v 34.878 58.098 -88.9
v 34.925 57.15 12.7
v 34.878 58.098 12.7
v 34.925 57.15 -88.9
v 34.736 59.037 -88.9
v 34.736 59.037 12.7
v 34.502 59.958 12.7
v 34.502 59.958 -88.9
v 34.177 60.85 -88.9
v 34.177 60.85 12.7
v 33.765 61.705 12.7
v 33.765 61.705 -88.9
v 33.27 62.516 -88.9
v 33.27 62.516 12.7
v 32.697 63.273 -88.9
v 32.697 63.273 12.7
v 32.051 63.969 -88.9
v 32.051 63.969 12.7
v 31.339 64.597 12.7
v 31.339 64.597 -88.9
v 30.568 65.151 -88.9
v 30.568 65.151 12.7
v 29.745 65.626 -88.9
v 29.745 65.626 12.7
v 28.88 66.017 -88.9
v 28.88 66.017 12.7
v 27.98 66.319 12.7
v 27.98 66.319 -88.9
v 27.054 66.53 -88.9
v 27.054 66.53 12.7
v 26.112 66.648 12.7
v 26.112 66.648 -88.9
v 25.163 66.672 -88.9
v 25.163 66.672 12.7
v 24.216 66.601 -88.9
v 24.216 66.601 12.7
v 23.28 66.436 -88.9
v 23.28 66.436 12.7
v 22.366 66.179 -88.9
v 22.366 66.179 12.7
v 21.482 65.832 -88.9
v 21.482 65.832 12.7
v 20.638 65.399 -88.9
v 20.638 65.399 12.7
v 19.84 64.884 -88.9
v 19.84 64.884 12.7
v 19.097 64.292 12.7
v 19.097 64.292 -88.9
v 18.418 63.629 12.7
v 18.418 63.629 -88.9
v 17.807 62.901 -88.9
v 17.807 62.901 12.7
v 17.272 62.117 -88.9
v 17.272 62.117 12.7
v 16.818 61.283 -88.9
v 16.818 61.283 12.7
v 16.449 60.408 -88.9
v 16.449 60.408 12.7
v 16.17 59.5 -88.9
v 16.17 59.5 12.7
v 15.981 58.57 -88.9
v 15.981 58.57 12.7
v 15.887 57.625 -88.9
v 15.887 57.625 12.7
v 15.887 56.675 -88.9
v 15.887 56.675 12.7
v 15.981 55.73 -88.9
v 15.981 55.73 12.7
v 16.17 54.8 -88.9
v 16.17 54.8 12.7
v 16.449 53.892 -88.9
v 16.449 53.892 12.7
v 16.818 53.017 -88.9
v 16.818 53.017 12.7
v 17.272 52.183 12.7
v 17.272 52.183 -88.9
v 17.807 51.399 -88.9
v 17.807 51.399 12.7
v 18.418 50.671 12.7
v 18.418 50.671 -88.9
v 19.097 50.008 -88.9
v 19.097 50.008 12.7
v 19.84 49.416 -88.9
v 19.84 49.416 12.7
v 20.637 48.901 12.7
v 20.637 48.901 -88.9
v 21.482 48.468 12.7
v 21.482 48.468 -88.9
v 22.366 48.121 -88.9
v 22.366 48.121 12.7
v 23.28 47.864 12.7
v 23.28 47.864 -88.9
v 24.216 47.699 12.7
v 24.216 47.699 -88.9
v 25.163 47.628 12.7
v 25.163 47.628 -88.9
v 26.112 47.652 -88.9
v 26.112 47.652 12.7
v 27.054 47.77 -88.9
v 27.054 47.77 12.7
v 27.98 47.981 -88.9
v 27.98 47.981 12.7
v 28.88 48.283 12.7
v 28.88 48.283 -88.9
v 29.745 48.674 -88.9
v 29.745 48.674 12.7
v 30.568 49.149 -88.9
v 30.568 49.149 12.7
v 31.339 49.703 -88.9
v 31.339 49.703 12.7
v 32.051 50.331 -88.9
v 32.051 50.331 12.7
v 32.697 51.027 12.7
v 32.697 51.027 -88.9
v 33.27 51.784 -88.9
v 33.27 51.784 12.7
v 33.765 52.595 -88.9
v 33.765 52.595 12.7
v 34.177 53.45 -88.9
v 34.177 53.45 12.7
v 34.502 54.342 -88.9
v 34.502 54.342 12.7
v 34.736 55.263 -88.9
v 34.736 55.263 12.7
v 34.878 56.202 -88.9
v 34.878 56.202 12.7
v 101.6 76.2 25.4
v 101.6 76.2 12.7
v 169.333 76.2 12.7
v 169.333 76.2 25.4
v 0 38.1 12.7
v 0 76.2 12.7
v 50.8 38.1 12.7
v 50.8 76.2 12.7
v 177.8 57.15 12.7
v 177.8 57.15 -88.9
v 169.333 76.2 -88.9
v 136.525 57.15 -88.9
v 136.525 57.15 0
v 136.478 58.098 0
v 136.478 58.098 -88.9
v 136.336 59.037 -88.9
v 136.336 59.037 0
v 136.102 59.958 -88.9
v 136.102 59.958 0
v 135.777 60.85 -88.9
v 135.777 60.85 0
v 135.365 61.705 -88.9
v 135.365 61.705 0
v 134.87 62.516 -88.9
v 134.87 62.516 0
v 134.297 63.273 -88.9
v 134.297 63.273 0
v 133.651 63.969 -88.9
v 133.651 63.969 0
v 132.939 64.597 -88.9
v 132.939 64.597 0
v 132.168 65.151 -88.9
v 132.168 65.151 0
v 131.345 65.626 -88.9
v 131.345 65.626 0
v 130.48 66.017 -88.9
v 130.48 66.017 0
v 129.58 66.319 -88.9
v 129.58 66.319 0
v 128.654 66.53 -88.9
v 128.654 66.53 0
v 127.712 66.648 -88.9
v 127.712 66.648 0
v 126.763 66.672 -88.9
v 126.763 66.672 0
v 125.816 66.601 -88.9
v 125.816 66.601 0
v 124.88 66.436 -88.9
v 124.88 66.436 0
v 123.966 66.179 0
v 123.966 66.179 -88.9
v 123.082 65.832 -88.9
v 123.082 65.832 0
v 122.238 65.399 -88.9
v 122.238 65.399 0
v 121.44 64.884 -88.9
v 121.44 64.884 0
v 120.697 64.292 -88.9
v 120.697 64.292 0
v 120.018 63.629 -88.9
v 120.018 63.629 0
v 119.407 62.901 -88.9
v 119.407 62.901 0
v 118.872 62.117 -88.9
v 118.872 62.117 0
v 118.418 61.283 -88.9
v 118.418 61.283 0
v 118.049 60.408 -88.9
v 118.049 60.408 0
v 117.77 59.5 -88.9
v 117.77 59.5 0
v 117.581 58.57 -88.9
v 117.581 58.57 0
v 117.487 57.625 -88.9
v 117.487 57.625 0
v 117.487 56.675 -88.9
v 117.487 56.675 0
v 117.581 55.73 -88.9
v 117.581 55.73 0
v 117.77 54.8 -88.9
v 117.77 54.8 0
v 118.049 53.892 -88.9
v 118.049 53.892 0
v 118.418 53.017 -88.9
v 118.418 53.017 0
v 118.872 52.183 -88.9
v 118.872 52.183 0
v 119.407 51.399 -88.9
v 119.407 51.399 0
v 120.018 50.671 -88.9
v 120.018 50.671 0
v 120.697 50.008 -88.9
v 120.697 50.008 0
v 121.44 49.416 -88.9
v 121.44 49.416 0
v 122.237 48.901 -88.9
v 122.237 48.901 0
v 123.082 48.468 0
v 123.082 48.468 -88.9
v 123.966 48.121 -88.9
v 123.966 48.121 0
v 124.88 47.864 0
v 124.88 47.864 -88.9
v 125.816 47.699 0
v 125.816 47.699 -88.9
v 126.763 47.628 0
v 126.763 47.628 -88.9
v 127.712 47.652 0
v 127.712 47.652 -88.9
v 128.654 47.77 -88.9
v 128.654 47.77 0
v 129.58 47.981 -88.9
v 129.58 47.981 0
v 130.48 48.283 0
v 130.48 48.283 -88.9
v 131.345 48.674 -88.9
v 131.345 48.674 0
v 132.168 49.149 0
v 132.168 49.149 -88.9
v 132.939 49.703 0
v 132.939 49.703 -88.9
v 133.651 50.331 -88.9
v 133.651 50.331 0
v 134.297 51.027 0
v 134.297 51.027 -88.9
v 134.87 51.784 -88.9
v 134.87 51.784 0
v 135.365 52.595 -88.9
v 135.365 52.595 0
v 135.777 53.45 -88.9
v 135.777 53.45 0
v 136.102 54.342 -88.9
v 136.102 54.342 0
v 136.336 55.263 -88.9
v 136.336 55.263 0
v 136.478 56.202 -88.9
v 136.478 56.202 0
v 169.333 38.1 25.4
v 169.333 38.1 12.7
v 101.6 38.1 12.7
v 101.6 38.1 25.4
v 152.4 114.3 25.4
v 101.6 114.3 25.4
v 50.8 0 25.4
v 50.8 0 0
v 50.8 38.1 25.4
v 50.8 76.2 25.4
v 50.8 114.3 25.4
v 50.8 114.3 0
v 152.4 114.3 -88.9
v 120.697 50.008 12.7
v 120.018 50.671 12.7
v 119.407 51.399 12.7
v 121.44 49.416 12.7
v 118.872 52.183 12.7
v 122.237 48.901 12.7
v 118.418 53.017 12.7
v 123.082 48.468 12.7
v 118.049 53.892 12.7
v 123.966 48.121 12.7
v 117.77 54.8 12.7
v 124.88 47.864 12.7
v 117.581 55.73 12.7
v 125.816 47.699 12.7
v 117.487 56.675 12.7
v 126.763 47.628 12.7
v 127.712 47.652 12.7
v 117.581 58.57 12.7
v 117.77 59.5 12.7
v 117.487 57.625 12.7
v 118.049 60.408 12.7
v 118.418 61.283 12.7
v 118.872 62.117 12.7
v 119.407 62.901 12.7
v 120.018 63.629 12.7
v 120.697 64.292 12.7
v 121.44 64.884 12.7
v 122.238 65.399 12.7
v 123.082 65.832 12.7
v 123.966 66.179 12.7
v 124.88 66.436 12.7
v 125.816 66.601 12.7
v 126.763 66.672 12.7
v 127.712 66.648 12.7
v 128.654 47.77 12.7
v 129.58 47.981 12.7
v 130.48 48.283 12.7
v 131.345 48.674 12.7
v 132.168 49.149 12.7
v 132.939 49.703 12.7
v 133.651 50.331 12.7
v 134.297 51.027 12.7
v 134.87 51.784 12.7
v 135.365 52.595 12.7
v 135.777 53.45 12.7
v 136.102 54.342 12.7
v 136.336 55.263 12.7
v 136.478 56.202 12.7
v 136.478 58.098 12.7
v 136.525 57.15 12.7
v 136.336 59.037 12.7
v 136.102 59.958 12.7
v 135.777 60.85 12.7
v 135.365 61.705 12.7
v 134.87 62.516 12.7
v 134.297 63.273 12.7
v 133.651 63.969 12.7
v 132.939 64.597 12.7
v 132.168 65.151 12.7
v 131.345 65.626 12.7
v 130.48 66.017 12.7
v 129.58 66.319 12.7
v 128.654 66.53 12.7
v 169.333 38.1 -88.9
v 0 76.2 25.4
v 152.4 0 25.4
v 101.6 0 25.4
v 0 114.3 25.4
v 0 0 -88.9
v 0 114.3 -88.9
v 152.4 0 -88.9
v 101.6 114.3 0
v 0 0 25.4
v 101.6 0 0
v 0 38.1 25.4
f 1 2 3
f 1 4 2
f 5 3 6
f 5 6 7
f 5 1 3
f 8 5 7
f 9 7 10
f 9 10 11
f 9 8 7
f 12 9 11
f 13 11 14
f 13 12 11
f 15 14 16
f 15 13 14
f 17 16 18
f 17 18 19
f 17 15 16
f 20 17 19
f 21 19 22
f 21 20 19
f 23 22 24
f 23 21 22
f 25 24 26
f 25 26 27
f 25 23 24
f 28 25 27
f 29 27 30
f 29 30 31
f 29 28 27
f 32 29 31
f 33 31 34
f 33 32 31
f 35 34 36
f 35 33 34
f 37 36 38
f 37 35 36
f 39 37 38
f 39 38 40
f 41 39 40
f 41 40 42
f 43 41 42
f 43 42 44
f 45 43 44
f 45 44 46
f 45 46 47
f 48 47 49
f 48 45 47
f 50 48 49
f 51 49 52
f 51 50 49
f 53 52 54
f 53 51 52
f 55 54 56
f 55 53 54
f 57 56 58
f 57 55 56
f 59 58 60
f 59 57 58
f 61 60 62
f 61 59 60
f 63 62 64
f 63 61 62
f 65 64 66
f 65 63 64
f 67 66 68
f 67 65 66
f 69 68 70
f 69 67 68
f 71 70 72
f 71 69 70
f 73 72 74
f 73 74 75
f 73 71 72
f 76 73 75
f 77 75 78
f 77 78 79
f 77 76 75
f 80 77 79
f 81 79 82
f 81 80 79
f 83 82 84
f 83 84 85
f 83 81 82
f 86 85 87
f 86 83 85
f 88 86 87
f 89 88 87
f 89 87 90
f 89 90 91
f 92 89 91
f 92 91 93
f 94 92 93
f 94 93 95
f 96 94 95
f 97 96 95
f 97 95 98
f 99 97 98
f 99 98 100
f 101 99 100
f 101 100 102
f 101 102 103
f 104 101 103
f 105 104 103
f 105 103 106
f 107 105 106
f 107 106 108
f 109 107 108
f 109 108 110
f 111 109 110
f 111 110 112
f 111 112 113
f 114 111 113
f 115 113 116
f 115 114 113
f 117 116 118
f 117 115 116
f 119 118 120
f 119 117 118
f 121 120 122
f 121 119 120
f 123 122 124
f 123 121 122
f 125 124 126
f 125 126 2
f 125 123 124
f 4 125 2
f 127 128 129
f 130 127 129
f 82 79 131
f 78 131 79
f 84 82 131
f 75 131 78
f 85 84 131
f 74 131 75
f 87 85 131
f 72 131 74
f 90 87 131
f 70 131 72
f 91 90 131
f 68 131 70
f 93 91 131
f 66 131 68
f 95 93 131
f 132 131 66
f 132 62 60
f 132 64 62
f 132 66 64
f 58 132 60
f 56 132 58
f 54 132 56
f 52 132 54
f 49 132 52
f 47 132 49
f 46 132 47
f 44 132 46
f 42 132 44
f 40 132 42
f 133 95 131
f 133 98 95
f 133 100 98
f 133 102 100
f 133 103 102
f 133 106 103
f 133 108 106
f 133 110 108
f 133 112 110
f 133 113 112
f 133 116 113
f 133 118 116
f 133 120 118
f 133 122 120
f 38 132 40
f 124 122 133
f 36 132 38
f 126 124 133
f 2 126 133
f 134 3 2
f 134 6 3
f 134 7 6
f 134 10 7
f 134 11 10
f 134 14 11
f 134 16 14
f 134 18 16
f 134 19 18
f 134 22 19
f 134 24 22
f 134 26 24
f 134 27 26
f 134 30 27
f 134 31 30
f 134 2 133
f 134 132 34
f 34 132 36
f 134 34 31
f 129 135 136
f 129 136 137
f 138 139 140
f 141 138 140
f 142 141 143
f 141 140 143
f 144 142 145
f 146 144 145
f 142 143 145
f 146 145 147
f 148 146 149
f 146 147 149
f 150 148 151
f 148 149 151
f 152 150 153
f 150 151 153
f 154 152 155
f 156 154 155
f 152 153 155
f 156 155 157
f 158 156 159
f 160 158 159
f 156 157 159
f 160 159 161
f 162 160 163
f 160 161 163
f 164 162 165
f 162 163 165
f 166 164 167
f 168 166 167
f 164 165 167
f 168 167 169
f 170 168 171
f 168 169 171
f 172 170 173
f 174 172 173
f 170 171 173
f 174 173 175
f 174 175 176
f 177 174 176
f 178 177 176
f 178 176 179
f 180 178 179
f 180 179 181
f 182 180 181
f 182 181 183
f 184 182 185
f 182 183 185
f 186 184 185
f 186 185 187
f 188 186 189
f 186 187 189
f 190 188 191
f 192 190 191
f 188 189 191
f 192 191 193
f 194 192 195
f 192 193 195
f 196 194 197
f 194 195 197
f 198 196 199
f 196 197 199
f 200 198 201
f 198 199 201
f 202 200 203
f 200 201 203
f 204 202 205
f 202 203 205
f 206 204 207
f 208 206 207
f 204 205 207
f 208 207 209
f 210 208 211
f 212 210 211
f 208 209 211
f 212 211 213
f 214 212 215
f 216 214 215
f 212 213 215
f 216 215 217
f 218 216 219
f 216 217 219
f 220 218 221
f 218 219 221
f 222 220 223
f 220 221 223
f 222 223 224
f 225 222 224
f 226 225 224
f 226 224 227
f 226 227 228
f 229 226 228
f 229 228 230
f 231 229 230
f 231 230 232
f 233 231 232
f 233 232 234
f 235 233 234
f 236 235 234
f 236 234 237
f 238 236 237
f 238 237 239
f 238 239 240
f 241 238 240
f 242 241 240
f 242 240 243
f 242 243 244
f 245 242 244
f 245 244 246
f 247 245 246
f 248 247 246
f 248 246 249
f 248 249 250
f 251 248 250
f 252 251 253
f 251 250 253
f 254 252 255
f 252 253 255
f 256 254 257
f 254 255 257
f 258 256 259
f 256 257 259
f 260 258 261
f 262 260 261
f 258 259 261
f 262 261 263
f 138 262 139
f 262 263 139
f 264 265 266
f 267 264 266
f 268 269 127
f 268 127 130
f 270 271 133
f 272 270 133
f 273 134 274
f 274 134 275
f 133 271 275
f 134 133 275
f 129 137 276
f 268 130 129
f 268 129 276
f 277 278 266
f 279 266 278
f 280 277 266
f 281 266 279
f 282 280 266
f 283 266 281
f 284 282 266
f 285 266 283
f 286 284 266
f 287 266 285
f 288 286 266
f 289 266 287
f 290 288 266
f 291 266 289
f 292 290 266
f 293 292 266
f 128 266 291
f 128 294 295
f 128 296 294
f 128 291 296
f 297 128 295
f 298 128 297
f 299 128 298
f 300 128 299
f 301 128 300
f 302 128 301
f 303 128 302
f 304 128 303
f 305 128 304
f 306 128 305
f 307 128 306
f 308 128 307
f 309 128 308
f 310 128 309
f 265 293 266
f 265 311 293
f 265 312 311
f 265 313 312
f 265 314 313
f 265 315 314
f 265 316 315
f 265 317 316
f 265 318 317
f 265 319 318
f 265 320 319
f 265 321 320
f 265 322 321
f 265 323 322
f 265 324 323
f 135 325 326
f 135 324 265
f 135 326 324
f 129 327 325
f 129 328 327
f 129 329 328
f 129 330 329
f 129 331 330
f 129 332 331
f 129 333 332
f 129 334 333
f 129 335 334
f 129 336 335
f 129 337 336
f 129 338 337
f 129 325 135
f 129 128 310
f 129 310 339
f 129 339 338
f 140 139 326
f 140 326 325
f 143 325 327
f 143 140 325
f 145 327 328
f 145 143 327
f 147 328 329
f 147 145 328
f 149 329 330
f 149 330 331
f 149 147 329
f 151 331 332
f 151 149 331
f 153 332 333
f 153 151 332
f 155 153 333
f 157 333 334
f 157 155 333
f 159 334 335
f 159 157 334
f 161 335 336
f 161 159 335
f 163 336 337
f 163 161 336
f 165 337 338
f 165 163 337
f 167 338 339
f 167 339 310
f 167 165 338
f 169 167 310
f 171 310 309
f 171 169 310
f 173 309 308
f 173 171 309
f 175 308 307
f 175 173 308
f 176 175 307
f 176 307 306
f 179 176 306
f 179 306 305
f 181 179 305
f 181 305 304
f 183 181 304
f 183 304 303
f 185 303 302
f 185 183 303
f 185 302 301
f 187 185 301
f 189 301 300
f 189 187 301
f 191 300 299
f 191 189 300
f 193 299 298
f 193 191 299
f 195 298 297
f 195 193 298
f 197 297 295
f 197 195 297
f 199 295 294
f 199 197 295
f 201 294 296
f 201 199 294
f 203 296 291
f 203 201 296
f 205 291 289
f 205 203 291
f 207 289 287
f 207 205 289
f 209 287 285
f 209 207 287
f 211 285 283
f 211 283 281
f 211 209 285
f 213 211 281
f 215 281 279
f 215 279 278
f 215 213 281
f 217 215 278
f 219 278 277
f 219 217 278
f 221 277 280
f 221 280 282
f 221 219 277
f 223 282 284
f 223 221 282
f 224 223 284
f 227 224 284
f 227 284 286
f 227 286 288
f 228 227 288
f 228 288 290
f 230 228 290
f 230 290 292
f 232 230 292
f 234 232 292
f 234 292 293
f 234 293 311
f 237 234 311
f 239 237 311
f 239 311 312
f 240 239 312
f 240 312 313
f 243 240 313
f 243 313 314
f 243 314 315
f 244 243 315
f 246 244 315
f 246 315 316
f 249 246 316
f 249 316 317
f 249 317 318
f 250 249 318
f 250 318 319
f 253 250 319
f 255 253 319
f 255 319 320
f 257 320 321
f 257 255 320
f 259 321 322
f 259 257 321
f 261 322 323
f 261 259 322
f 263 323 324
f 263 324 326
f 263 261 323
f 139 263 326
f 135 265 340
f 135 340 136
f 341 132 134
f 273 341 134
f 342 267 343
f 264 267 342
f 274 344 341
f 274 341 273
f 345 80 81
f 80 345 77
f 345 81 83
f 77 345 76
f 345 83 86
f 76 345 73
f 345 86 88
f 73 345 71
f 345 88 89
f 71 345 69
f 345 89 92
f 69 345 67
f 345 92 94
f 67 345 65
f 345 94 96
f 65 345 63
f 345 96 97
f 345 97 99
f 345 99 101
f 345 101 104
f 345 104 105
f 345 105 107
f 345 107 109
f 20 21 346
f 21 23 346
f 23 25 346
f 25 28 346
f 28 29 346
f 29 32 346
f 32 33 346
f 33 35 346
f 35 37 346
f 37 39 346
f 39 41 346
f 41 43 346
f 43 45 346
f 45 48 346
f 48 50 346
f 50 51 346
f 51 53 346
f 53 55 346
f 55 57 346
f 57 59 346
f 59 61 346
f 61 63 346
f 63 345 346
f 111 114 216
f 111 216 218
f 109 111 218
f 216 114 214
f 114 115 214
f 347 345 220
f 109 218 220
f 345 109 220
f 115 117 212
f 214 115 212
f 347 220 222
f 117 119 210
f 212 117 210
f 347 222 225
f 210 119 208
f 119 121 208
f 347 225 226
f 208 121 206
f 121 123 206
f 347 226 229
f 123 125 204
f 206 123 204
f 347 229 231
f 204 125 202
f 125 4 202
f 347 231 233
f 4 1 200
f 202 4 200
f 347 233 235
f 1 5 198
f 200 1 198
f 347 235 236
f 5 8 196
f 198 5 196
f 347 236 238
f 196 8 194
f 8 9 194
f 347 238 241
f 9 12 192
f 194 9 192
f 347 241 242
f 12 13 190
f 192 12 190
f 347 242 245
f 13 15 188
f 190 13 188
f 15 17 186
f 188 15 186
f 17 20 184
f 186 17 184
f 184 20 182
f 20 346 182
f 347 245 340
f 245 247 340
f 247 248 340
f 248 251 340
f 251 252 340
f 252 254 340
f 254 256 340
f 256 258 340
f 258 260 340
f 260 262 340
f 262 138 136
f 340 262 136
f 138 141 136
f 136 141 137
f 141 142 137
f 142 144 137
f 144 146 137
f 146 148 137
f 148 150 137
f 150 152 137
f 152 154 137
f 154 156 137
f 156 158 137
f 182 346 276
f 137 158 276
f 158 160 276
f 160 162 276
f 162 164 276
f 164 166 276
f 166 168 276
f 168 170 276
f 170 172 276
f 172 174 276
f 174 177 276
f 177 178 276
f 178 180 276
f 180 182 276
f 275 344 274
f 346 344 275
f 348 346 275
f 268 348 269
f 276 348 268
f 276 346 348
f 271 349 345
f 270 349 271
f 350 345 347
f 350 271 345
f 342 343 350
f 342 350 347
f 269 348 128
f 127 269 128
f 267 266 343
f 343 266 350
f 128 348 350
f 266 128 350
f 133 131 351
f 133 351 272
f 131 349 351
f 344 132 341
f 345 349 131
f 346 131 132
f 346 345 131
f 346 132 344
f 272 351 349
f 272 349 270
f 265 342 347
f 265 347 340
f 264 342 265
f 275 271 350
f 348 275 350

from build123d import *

# Parameters (mm, degrees)
F0_W     = 50.8
F0_H     = 38.1
F0_R     = 9.525
F1_DEPTH = 88.9
F2_DEPTH = 25.4
F3_DEPTH = 12.7


with BuildPart() as f1:
    # F0 (on Top) → F1 (new body)
    with BuildSketch(Plane.XY):
        with Locations((25.4, 95.25)):
            Rectangle(F0_W, F0_H)
        with Locations((25.4, 57.15)):
            Rectangle(F0_W, F0_H)
        with Locations((25.4, 57.15)):
            Circle(F0_R, mode=Mode.SUBTRACT)
        with Locations((25.4, 19.05)):
            Rectangle(F0_W, F0_H)
        Polygon((101.6, 114.3), (50.8, 114.3), (50.8, 76.2), (50.8, 38.1), (50.8, 0), (101.6, 0), (101.6, 38.1), (101.6, 76.2), align=None)
        Polygon((152.4, 114.3), (101.6, 114.3), (101.6, 76.2), (169.3333333333, 76.2), align=None)
        Polygon((169.3333333333, 76.2), (101.6, 76.2), (101.6, 38.1), (169.3333333333, 38.1), (177.8, 57.15), align=None)
        with Locations((127, 57.15)):
            Circle(F0_R, mode=Mode.SUBTRACT)
        Polygon((169.3333333333, 38.1), (101.6, 38.1), (101.6, 0), (152.4, 0), align=None)
    extrude(amount=-F1_DEPTH)

    # F0 (on Top) → F2 (join)
    with BuildSketch(Plane.XY):
        with Locations((25.4, 95.25)):
            Rectangle(F0_W, F0_H)
        with Locations((25.4, 19.05)):
            Rectangle(F0_W, F0_H)
        Polygon((152.4, 114.3), (101.6, 114.3), (101.6, 76.2), (169.3333333333, 76.2), align=None)
        Polygon((169.3333333333, 38.1), (101.6, 38.1), (101.6, 0), (152.4, 0), align=None)
    extrude(amount=F2_DEPTH)

    # F0 (on Top) → F3 (join)
    with BuildSketch(Plane.XY):
        with Locations((25.4, 57.15)):
            Rectangle(F0_W, F0_H)
        with Locations((25.4, 57.15)):
            Circle(F0_R, mode=Mode.SUBTRACT)
        Polygon((169.3333333333, 76.2), (101.6, 76.2), (101.6, 38.1), (169.3333333333, 38.1), (177.8, 57.15), align=None)
        with Locations((127, 57.15)):
            Circle(F0_R, mode=Mode.SUBTRACT)
    extrude(amount=F3_DEPTH)


solid = f1.part
